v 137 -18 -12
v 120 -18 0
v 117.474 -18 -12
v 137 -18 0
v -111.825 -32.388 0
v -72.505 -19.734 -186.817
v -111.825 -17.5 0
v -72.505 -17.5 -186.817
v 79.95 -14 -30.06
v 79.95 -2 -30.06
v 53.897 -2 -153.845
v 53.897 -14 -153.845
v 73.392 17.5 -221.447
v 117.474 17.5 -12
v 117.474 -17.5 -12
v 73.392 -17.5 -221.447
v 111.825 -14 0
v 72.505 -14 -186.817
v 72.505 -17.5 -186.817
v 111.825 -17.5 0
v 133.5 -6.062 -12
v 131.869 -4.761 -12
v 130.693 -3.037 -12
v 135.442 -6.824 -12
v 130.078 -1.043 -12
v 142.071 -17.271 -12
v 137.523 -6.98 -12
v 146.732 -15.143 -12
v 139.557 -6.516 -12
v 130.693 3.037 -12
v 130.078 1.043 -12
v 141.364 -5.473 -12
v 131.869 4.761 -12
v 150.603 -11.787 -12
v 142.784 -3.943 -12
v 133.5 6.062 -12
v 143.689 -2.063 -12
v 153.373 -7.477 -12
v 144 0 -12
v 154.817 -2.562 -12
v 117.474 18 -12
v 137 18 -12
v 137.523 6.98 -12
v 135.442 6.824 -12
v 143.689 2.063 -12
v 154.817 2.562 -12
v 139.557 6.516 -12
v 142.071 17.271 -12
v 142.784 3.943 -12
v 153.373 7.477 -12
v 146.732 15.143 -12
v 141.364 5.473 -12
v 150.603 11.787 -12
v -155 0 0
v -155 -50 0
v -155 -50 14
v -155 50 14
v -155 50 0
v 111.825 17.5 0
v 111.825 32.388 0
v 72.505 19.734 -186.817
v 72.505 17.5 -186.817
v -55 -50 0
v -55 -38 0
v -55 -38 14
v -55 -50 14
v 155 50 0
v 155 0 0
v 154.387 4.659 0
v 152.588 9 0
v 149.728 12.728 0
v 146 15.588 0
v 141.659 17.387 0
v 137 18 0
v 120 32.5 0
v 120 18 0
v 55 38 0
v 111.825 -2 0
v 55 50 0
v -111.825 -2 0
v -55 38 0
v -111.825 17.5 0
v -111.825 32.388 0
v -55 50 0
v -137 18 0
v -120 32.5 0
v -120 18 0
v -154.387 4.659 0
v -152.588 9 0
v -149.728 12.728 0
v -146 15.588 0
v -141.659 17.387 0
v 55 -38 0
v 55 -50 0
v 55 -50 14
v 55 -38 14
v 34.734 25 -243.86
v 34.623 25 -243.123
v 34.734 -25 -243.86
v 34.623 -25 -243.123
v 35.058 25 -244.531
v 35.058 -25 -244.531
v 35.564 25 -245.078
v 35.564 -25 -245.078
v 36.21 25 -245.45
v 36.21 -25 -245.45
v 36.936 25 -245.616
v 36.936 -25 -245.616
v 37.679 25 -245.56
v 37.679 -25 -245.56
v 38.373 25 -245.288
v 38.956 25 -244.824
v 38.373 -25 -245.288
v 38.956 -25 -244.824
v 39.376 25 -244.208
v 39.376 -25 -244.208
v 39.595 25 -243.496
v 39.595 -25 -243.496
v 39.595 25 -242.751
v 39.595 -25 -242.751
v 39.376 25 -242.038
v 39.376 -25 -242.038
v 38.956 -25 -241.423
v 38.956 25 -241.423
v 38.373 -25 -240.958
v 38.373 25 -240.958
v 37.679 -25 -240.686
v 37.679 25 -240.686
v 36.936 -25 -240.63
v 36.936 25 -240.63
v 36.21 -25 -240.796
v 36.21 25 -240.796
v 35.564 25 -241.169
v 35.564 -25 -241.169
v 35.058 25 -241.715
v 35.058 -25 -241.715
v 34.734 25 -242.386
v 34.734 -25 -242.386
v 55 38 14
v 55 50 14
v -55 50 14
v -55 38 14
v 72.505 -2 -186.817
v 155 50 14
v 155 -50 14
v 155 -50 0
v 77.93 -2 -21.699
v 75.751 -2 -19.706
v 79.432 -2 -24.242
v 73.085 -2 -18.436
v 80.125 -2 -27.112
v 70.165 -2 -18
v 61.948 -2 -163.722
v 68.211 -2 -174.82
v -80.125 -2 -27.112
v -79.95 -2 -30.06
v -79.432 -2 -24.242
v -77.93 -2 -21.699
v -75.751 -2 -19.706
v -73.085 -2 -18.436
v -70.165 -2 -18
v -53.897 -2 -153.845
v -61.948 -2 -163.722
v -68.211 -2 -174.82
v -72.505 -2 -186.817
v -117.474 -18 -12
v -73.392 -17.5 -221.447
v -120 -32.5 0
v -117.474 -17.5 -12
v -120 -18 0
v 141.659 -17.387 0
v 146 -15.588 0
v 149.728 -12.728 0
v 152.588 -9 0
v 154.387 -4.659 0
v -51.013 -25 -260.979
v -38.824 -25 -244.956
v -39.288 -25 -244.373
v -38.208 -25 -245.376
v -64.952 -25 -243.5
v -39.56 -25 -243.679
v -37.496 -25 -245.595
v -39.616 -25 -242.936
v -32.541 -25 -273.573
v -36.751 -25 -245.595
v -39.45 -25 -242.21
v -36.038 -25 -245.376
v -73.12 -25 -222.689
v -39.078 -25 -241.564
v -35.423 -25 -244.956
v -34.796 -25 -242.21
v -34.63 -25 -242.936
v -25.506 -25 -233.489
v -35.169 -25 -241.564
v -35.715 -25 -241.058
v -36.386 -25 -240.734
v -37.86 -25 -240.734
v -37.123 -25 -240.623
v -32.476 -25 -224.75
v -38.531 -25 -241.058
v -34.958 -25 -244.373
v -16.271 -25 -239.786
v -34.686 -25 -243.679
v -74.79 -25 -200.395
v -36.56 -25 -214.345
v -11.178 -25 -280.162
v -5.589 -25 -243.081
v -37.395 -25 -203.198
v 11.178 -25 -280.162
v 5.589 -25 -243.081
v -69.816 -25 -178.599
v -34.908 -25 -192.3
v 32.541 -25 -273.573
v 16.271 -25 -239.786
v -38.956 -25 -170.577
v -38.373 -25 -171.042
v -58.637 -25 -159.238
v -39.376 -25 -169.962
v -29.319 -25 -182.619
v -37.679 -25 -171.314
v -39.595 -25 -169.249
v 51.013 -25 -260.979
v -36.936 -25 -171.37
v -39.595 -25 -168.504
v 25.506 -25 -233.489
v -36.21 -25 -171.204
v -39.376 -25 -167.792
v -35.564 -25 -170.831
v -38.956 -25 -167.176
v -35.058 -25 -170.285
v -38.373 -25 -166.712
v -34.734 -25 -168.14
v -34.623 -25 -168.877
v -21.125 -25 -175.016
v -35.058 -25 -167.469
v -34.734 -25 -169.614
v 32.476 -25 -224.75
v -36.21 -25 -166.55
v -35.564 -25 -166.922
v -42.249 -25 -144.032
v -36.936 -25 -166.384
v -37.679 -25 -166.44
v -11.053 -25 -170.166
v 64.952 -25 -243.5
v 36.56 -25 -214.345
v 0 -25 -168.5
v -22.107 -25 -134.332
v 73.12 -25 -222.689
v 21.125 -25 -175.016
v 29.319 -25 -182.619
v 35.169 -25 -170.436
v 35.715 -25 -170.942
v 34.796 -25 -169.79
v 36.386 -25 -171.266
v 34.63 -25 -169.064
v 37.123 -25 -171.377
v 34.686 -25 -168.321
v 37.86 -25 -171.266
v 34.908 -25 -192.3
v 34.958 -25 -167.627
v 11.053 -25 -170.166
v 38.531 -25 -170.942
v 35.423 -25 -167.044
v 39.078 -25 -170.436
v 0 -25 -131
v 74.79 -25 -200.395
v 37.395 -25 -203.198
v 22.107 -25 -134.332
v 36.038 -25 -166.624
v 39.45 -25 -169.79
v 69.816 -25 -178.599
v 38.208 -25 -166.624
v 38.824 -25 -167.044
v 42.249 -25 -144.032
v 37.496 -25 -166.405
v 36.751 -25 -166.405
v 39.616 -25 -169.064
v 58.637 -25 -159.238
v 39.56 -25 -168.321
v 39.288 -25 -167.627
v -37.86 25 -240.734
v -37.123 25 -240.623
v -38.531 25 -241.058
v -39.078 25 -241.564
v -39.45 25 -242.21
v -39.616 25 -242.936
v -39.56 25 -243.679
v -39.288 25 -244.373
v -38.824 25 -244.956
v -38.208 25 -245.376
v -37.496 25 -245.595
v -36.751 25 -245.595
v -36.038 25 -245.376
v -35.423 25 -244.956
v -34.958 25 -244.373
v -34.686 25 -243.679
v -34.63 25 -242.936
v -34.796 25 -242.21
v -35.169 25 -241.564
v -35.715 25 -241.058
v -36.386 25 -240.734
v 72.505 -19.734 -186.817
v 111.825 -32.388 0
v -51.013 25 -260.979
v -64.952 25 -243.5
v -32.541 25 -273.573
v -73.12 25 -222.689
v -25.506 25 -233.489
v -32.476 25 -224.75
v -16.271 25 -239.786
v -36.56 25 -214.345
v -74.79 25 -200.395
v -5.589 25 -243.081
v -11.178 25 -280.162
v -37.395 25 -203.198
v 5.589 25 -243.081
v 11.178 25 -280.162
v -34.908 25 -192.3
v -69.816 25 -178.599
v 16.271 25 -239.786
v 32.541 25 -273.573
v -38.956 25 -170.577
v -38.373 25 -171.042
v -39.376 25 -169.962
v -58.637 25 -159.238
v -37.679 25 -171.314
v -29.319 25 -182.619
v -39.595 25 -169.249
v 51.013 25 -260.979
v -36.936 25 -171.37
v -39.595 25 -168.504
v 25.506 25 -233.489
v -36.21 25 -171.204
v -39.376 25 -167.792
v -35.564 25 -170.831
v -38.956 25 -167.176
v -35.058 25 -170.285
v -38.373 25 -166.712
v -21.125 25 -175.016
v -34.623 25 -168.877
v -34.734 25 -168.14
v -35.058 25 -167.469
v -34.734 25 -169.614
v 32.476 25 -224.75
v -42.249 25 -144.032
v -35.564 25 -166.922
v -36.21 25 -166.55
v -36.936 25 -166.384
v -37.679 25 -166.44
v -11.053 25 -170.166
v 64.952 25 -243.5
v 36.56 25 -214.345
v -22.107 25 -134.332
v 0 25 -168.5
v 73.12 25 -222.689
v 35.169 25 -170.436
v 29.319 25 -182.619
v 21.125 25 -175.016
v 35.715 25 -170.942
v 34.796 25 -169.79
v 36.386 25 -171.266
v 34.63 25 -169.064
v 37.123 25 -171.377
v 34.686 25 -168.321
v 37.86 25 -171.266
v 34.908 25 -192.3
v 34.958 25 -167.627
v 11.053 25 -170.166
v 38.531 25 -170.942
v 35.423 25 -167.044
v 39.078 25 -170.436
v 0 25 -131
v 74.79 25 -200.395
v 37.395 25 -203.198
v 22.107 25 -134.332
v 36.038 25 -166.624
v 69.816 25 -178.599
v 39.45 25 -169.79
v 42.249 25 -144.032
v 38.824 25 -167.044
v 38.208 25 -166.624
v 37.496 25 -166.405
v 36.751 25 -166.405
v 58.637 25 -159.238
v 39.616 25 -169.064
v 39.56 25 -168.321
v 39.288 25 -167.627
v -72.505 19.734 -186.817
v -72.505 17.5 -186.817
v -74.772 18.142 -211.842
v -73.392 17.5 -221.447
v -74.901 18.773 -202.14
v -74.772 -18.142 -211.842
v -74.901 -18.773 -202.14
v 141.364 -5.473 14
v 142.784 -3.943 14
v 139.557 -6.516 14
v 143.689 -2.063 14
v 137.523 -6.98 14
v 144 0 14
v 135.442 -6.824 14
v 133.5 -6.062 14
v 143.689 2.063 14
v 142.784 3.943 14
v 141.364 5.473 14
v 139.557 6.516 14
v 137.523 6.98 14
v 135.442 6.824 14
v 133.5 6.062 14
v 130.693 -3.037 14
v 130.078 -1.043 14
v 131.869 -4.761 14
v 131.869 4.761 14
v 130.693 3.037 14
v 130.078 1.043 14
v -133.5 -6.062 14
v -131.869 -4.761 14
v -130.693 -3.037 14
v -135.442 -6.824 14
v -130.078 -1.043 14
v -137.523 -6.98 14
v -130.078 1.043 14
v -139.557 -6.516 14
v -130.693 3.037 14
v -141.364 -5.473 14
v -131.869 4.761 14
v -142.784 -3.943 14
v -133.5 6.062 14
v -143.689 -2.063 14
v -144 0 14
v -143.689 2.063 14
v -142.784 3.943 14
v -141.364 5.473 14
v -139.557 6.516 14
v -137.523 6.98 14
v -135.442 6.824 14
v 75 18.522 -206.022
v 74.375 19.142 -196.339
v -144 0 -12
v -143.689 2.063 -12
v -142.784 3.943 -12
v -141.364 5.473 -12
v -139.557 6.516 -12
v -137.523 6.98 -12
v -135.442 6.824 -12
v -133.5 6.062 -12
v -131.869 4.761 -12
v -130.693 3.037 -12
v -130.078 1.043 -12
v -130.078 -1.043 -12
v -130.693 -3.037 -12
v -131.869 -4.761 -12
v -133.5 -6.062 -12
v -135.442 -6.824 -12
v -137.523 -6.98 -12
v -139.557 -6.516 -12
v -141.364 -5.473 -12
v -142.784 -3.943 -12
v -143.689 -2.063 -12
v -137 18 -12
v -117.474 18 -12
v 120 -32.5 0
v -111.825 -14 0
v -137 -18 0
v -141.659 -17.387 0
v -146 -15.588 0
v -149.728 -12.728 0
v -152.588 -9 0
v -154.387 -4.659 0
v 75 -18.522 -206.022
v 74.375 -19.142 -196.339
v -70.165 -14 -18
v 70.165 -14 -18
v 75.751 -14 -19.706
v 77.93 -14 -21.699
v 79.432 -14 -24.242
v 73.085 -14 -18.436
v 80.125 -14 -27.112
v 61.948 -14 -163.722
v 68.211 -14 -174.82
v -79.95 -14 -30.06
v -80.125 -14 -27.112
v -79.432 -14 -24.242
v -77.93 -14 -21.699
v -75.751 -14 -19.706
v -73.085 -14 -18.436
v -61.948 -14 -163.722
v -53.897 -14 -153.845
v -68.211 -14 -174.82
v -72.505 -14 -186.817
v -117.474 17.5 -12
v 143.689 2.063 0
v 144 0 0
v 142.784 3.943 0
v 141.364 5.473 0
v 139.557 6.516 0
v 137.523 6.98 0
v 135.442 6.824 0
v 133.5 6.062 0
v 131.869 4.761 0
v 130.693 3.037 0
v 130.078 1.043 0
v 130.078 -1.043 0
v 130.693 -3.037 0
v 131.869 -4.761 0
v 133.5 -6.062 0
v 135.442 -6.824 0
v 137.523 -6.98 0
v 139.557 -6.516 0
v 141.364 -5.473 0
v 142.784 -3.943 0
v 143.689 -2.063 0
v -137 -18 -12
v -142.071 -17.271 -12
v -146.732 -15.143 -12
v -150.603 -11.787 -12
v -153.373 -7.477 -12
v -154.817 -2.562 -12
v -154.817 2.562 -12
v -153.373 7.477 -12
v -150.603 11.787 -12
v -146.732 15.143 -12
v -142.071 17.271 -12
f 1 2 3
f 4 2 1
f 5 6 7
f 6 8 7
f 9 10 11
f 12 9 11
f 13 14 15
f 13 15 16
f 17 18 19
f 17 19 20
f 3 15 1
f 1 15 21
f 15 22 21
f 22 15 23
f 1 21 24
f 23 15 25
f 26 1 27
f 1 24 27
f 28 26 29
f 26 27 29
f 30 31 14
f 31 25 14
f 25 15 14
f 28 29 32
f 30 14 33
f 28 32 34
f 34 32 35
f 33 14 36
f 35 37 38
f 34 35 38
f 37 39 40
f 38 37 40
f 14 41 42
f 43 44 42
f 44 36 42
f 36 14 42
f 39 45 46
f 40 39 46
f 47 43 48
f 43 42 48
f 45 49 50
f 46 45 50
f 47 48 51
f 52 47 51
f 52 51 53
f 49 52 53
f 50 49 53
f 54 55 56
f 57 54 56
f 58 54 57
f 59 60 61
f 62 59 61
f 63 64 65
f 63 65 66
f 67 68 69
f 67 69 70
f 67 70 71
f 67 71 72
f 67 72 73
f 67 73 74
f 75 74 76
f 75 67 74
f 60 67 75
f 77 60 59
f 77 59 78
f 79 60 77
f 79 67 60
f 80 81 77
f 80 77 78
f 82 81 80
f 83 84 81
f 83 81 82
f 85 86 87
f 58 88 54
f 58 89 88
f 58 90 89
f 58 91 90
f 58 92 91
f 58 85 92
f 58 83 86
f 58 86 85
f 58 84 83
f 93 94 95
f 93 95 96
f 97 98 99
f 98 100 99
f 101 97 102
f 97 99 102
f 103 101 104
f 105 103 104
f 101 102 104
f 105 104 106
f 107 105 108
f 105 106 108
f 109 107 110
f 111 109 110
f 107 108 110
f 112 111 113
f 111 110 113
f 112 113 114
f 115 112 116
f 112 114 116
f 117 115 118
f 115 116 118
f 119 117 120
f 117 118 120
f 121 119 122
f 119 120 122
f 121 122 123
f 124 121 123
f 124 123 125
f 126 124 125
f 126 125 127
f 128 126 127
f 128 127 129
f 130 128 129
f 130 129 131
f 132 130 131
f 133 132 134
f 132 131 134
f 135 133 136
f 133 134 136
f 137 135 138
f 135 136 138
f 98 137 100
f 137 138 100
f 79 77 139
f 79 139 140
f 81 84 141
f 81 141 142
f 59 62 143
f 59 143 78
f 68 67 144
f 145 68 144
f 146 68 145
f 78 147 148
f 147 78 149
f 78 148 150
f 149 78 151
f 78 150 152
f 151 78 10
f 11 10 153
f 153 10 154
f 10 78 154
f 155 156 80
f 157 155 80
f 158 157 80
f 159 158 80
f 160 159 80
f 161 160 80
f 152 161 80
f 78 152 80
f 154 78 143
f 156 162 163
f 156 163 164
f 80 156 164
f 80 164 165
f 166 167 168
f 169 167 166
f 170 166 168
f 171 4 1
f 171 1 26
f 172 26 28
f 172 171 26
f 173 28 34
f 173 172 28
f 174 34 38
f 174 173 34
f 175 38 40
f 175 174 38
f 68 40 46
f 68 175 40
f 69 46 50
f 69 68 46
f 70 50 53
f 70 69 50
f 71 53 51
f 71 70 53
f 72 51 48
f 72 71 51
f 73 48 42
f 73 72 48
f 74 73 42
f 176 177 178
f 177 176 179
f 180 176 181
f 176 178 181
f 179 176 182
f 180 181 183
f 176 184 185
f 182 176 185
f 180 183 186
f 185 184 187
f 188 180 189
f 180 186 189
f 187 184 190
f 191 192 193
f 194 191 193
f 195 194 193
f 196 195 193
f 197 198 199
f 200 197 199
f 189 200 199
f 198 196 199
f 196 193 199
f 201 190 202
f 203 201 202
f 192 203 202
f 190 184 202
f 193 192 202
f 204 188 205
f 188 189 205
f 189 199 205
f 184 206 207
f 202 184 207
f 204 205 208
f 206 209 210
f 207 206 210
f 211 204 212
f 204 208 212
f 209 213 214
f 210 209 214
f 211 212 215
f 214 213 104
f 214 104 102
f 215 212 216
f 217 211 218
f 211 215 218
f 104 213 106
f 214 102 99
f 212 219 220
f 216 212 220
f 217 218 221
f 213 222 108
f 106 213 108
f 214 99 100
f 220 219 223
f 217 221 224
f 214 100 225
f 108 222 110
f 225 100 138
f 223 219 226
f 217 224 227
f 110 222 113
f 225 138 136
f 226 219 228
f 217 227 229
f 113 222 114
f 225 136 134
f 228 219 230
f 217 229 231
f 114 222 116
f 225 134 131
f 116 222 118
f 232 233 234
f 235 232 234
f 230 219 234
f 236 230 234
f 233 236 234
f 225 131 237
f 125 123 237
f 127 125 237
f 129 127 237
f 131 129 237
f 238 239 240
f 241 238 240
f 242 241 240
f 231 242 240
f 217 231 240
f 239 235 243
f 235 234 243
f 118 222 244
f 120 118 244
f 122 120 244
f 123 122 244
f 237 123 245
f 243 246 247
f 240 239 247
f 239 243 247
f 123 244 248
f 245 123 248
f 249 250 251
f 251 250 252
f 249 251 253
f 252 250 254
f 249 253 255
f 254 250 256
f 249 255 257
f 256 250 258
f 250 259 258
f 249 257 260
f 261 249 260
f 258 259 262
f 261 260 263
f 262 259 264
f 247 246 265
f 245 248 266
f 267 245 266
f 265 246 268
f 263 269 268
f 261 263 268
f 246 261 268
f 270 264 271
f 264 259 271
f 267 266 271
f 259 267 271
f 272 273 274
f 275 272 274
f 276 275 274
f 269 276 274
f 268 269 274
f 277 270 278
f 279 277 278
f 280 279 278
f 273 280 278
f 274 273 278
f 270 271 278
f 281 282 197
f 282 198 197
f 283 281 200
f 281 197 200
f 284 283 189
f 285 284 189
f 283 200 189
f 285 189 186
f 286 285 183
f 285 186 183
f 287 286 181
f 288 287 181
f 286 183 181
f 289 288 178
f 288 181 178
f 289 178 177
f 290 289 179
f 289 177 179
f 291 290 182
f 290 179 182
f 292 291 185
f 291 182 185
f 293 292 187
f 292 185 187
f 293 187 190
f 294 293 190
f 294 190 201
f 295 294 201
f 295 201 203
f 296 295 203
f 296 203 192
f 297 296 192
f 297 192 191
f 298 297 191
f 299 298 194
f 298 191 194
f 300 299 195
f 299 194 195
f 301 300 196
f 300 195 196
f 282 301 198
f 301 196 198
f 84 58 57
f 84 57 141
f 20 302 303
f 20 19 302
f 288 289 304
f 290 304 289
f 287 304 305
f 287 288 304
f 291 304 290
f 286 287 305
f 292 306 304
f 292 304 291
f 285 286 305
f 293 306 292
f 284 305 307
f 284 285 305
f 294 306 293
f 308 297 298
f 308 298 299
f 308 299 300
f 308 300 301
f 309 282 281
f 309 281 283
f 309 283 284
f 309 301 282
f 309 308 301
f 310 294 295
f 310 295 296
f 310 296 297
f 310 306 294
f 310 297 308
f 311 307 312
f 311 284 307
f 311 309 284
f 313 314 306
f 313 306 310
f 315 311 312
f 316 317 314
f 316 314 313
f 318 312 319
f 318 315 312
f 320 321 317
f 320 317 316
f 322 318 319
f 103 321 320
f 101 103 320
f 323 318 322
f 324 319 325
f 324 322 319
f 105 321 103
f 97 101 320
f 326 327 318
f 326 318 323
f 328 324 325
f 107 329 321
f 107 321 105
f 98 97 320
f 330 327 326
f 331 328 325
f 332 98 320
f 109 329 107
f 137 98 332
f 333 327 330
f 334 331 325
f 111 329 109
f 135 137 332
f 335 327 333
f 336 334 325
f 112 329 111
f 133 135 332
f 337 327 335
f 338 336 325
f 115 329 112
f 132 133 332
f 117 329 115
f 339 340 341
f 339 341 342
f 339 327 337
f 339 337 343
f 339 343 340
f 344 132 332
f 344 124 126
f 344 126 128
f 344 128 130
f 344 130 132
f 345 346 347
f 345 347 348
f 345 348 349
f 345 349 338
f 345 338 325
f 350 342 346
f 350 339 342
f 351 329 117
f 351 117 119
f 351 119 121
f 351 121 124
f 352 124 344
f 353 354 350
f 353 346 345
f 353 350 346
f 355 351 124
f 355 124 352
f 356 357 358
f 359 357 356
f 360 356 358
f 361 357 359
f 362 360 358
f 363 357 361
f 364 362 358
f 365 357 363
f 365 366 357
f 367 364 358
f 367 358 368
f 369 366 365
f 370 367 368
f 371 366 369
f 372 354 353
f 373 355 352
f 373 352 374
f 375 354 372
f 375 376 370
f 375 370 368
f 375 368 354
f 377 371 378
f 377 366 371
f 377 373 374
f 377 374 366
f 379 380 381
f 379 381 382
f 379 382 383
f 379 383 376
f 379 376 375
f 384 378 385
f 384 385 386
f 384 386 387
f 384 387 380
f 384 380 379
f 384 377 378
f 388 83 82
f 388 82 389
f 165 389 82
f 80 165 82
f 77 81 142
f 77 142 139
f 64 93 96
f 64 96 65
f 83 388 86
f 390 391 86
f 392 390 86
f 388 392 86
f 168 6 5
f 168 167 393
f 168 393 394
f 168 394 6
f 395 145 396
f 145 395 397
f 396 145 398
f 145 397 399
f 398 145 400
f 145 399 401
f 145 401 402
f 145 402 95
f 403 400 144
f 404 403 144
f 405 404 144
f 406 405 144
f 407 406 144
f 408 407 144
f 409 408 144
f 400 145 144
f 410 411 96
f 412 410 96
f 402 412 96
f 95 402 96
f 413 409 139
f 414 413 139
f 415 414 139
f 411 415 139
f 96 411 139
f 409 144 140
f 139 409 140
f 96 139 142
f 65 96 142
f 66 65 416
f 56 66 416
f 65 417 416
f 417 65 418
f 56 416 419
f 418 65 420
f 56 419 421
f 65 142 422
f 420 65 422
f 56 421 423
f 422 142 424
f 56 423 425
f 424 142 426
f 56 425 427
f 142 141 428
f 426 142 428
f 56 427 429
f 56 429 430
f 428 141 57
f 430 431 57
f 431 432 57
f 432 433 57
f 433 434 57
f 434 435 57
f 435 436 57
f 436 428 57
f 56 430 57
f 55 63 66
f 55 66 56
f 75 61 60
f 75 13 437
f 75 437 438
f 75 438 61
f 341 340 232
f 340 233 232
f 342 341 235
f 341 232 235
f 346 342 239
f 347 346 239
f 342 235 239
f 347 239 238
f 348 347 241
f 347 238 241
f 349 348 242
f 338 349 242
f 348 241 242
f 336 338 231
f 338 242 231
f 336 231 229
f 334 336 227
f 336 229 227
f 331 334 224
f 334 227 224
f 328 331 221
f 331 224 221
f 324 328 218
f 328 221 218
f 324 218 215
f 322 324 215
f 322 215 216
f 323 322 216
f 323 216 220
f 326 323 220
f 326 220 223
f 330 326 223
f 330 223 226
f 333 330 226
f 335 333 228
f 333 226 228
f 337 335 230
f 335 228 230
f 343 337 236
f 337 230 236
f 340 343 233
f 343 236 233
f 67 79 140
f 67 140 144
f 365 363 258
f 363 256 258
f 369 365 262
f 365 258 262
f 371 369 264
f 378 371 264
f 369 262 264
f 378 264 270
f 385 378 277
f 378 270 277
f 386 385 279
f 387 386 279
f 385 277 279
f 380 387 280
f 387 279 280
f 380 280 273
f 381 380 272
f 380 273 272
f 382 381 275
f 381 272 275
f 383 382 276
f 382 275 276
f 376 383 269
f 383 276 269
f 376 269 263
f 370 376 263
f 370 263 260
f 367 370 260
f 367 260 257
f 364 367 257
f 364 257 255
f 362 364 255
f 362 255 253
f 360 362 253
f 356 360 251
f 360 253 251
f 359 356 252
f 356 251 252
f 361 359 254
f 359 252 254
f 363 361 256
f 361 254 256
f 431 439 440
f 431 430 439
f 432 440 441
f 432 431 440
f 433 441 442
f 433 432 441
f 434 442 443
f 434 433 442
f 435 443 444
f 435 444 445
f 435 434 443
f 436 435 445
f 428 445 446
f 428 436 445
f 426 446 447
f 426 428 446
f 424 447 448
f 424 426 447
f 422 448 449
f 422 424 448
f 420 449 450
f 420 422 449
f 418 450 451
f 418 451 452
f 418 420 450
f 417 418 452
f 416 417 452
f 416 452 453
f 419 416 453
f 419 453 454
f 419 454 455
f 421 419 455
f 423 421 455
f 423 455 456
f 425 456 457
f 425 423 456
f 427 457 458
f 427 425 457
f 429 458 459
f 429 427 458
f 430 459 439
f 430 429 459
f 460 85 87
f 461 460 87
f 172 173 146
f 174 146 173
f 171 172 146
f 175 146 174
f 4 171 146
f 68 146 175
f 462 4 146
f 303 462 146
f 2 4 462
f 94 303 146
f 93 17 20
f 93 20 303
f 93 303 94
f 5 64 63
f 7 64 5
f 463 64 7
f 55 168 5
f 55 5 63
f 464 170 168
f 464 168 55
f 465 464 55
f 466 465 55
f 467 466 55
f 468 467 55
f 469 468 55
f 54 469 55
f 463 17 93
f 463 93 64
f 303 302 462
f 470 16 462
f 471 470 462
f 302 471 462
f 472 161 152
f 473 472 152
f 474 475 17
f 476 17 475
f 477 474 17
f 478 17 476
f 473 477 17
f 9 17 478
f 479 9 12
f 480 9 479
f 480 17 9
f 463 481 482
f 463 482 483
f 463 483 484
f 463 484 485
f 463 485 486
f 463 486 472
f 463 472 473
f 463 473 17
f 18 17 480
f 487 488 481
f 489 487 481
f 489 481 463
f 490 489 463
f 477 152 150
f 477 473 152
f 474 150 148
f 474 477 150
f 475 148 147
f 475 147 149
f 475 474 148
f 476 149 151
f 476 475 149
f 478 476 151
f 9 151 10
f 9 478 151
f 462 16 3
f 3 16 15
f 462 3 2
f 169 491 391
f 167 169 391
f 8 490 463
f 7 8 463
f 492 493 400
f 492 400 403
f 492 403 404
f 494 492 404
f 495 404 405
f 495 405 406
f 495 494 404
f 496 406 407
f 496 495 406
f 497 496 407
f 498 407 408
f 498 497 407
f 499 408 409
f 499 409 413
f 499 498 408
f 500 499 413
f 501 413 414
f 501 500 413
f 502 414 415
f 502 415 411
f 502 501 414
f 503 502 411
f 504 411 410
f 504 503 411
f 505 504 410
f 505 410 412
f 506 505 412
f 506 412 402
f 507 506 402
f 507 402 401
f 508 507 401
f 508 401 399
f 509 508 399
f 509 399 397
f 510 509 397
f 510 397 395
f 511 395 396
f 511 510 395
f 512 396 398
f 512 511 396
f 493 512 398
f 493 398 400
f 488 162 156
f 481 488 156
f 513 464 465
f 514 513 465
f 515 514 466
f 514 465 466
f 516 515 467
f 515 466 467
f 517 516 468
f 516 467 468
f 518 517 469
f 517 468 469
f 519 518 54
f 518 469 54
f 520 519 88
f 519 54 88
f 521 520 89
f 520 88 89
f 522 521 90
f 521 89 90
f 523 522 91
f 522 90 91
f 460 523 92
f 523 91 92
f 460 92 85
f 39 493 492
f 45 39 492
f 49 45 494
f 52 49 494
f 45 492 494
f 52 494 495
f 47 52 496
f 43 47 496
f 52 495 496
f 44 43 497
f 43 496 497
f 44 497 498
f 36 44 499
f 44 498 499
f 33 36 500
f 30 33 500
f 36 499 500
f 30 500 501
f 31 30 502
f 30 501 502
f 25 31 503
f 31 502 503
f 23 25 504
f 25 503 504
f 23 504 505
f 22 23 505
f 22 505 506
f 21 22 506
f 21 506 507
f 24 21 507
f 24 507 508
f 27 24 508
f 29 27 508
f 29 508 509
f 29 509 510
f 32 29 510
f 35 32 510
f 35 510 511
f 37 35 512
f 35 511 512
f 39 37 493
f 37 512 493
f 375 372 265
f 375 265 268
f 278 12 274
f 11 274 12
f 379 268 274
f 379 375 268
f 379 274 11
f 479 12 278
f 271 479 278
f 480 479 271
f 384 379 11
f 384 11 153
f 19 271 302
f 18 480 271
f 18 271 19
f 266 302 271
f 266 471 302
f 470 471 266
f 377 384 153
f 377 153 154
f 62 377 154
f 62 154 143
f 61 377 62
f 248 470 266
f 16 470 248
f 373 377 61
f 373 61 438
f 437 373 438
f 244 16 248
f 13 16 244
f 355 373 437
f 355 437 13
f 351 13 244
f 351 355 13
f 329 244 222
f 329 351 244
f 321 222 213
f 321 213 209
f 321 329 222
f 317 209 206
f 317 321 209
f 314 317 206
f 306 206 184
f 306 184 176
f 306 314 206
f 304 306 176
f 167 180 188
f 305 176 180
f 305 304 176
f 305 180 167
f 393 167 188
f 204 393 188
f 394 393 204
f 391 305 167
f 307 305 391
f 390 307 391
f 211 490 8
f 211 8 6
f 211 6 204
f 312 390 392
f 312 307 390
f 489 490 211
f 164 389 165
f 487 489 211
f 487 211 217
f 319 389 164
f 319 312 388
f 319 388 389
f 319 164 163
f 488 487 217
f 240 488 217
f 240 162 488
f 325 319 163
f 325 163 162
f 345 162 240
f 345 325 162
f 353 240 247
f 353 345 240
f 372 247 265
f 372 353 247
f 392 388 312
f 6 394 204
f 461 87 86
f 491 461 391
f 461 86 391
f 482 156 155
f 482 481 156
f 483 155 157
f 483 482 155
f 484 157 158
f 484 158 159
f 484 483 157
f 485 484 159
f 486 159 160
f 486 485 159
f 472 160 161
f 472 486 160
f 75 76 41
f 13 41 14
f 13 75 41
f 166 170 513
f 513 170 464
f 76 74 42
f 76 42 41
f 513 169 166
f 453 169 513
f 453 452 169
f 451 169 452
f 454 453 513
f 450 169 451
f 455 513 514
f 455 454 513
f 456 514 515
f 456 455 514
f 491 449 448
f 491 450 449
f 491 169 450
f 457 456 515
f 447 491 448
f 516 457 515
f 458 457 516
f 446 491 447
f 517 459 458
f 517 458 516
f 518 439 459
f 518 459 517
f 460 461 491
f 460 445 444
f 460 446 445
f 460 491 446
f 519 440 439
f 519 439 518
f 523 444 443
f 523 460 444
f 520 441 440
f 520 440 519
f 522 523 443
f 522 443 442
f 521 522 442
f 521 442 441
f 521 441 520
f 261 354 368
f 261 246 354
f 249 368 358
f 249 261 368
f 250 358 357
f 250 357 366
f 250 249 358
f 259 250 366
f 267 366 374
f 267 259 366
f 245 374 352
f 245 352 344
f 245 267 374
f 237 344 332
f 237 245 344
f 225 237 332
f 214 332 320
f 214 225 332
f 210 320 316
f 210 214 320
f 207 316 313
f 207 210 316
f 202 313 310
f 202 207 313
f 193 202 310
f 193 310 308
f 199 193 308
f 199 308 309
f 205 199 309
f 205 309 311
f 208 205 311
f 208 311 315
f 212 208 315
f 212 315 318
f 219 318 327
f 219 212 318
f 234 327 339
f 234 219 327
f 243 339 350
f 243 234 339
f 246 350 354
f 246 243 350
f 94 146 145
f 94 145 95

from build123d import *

# Parameters (mm, degrees)
BOSS_EXTRUDE1_DEPTH = 14
SKETCH2_R           = 75
SKETCH2_R_2         = 37.5
BOSS_EXTRUDE2_DEPTH = 25
SKETCH5_W           = 2.5
SKETCH5_H           = 50
CIRPATTERN1_COUNT   = 4
BOSS_EXTRUDE3_DEPTH = 17.5
BOSS_EXTRUDE4_DEPTH = 8
SKETCH9_R           = 7
BOSS_EXTRUDE5_DEPTH = 12
SKETCH10_R          = 7
CUT_EXTRUDE1_DEPTH  = 14
BOSS_EXTRUDE6_DEPTH = 12
FILLET1_R           = 10


with BuildPart() as part:
    # Sketch1 → Boss-Extrude1 (new body)
    with BuildSketch(Plane.XY):
        Polygon((-155, 50), (-55, 50), (-55, 38), (55, 38), (55, 50), (155, 50), (155, -50), (55, -50), (55, -38), (-55, -38), (-55, -50), (-155, -50), align=None)
    extrude(amount=BOSS_EXTRUDE1_DEPTH)



with BuildPart() as body_2:
    # Sketch2 → Boss-Extrude2 (new body, symmetric)
    with BuildSketch(Plane(origin=(0, 0, 0), x_dir=(1, 0, 0), z_dir=(0, 1, 0))):
        with Locations(Location((0, 206, 0), (0, 0, 270))):  # turned: the seam where the file's is
            Circle(SKETCH2_R)
        with Locations(Location((0, 206, 0), (0, 0, 270))):  # turned: the seam where the file's is
            Circle(SKETCH2_R_2, mode=Mode.SUBTRACT)
    extrude(amount=BOSS_EXTRUDE2_DEPTH, both=True)

    # Sketch5 → M6 Tapped Hole1 (revolve, cut)
    with BuildSketch(Plane(origin=(-37.123106012, 25, -243.123106012), x_dir=(0, 0, 1), z_dir=(1, 0, 0))):
        with Locations((1.25, 25)):
            Rectangle(SKETCH5_W, SKETCH5_H)
    m6_tapped_hole1 = revolve(axis=Axis((-37.123106012, 31.35, -243.123106012), (0, -1, 0)), mode=Mode.SUBTRACT)

    # CirPattern1: M6 Tapped Hole1 ×4 about axis
    cirpattern1_axis = Axis((0, 0, -206), (0, 1, 0))
    for i in range(1, CIRPATTERN1_COUNT):
        add(m6_tapped_hole1.rotate(cirpattern1_axis, i * 360 / CIRPATTERN1_COUNT), mode=Mode.SUBTRACT)


with BuildPart() as part_1:
    add(part.part)

    add(body_2.part)  # Boss-Extrude3 merges body 2
    # Sketch7 → Boss-Extrude3 (add, symmetric)
    with BuildSketch(Plane(origin=(0, 0, 0), x_dir=(1, 0, 0), z_dir=(0, 1, 0))):
        with BuildLine():
            Line((-111.824729359, 0), (-120, 0))
            Line((-120, 0), (-73.392065698, 221.446834387))
            ThreePointArc((-73.392065698, 221.446834387), (-74.975422623, 204.08010351), (-72.505303494, 186.81717004))
            Line((-72.505303494, 186.81717004), (-111.824729359, 0))
        make_face()
    boss_extrude3 = extrude(amount=BOSS_EXTRUDE3_DEPTH, both=True)

    # Sketch8 → Boss-Extrude4 (add)
    with BuildSketch(Plane(origin=(-114.909766558, 0, -24.185068462), x_dir=(-0.205957792, 0, 0.978560876), z_dir=(-0.978560876, 0, -0.205957792))):
        Polygon((-201.58354045, 17.5), (24.714935019, 32.5), (24.714935019, 17.5), align=None)
        Polygon((24.714935019, -32.5), (24.714935019, -17.5), (-201.58354045, -17.5), align=None)
    boss_extrude4 = extrude(amount=-BOSS_EXTRUDE4_DEPTH)

    # Sketch9 → Boss-Extrude5 (add)
    with BuildSketch(Plane(origin=(0, 0, 0), x_dir=(-1, 0, 0), z_dir=(0, 0, -1))):
        with BuildLine():
            Line((111.824729359, 18), (111.824729359, -18))
            Line((111.824729359, -18), (137, -18))
            ThreePointArc((137, -18), (155, 0), (137, 18))
            Line((137, 18), (111.824729359, 18))
        make_face()
        with Locations((137, 0)):
            Circle(SKETCH9_R, mode=Mode.SUBTRACT)
    boss_extrude5 = extrude(amount=BOSS_EXTRUDE5_DEPTH)

    # Sketch10 → Cut-Extrude1 (cut)
    with BuildSketch(Plane(origin=(0, 0, 0), x_dir=(-1, 0, 0), z_dir=(0, 0, -1))):
        with Locations((137, 0)):
            Circle(SKETCH10_R)
    cut_extrude1 = extrude(amount=-CUT_EXTRUDE1_DEPTH, mode=Mode.SUBTRACT)

    # Mirror3: Boss-Extrude3, Boss-Extrude4, Boss-Extrude5, Cut-Extrude1 across plane
    add(boss_extrude3.mirror(Plane(origin=(0, 0, 0), x_dir=(0, 0, 1), z_dir=(1, 0, 0))))
    add(boss_extrude4.mirror(Plane(origin=(0, 0, 0), x_dir=(0, 0, 1), z_dir=(1, 0, 0))))
    add(boss_extrude5.mirror(Plane(origin=(0, 0, 0), x_dir=(0, 0, 1), z_dir=(1, 0, 0))))
    add(cut_extrude1.mirror(Plane(origin=(0, 0, 0), x_dir=(0, 0, 1), z_dir=(1, 0, 0))), mode=Mode.SUBTRACT)

    # Sketch13 → Boss-Extrude6 (add)
    with BuildSketch(Plane(origin=(0, -2, 0), x_dir=(1, 0, 0), z_dir=(0, 1, 0))):
        with BuildLine():
            Line((-111.824729359, 0), (-72.505303494, 186.81717004))
            ThreePointArc((-72.505303494, 186.81717004), (-65.31598907, 169.137802944), (-53.897144884, 153.845443407))
            Line((-53.897144884, 153.845443407), (-82.488547055, 18))
            Line((-82.488547055, 18), (82.488547055, 18))
            Line((82.488547055, 18), (53.897144884, 153.845443407))
            ThreePointArc((53.897144884, 153.845443407), (65.31598907, 169.137802944), (72.505303494, 186.81717004))
            Line((72.505303494, 186.81717004), (111.824729359, 0))
            Line((111.824729359, 0), (55, 0))
            Line((55, 0), (-111.824729359, 0))
        make_face()
    extrude(amount=-BOSS_EXTRUDE6_DEPTH)

    # Fillet1
    fillet1_edges = [part_1.edges().sort_by_distance(p)[0] for p in [
        (-82.488547055, -8, -18),
        (82.488547055, -8, -18),
    ]]
    fillet(fillet1_edges, radius=FILLET1_R)


solid = part_1.part
